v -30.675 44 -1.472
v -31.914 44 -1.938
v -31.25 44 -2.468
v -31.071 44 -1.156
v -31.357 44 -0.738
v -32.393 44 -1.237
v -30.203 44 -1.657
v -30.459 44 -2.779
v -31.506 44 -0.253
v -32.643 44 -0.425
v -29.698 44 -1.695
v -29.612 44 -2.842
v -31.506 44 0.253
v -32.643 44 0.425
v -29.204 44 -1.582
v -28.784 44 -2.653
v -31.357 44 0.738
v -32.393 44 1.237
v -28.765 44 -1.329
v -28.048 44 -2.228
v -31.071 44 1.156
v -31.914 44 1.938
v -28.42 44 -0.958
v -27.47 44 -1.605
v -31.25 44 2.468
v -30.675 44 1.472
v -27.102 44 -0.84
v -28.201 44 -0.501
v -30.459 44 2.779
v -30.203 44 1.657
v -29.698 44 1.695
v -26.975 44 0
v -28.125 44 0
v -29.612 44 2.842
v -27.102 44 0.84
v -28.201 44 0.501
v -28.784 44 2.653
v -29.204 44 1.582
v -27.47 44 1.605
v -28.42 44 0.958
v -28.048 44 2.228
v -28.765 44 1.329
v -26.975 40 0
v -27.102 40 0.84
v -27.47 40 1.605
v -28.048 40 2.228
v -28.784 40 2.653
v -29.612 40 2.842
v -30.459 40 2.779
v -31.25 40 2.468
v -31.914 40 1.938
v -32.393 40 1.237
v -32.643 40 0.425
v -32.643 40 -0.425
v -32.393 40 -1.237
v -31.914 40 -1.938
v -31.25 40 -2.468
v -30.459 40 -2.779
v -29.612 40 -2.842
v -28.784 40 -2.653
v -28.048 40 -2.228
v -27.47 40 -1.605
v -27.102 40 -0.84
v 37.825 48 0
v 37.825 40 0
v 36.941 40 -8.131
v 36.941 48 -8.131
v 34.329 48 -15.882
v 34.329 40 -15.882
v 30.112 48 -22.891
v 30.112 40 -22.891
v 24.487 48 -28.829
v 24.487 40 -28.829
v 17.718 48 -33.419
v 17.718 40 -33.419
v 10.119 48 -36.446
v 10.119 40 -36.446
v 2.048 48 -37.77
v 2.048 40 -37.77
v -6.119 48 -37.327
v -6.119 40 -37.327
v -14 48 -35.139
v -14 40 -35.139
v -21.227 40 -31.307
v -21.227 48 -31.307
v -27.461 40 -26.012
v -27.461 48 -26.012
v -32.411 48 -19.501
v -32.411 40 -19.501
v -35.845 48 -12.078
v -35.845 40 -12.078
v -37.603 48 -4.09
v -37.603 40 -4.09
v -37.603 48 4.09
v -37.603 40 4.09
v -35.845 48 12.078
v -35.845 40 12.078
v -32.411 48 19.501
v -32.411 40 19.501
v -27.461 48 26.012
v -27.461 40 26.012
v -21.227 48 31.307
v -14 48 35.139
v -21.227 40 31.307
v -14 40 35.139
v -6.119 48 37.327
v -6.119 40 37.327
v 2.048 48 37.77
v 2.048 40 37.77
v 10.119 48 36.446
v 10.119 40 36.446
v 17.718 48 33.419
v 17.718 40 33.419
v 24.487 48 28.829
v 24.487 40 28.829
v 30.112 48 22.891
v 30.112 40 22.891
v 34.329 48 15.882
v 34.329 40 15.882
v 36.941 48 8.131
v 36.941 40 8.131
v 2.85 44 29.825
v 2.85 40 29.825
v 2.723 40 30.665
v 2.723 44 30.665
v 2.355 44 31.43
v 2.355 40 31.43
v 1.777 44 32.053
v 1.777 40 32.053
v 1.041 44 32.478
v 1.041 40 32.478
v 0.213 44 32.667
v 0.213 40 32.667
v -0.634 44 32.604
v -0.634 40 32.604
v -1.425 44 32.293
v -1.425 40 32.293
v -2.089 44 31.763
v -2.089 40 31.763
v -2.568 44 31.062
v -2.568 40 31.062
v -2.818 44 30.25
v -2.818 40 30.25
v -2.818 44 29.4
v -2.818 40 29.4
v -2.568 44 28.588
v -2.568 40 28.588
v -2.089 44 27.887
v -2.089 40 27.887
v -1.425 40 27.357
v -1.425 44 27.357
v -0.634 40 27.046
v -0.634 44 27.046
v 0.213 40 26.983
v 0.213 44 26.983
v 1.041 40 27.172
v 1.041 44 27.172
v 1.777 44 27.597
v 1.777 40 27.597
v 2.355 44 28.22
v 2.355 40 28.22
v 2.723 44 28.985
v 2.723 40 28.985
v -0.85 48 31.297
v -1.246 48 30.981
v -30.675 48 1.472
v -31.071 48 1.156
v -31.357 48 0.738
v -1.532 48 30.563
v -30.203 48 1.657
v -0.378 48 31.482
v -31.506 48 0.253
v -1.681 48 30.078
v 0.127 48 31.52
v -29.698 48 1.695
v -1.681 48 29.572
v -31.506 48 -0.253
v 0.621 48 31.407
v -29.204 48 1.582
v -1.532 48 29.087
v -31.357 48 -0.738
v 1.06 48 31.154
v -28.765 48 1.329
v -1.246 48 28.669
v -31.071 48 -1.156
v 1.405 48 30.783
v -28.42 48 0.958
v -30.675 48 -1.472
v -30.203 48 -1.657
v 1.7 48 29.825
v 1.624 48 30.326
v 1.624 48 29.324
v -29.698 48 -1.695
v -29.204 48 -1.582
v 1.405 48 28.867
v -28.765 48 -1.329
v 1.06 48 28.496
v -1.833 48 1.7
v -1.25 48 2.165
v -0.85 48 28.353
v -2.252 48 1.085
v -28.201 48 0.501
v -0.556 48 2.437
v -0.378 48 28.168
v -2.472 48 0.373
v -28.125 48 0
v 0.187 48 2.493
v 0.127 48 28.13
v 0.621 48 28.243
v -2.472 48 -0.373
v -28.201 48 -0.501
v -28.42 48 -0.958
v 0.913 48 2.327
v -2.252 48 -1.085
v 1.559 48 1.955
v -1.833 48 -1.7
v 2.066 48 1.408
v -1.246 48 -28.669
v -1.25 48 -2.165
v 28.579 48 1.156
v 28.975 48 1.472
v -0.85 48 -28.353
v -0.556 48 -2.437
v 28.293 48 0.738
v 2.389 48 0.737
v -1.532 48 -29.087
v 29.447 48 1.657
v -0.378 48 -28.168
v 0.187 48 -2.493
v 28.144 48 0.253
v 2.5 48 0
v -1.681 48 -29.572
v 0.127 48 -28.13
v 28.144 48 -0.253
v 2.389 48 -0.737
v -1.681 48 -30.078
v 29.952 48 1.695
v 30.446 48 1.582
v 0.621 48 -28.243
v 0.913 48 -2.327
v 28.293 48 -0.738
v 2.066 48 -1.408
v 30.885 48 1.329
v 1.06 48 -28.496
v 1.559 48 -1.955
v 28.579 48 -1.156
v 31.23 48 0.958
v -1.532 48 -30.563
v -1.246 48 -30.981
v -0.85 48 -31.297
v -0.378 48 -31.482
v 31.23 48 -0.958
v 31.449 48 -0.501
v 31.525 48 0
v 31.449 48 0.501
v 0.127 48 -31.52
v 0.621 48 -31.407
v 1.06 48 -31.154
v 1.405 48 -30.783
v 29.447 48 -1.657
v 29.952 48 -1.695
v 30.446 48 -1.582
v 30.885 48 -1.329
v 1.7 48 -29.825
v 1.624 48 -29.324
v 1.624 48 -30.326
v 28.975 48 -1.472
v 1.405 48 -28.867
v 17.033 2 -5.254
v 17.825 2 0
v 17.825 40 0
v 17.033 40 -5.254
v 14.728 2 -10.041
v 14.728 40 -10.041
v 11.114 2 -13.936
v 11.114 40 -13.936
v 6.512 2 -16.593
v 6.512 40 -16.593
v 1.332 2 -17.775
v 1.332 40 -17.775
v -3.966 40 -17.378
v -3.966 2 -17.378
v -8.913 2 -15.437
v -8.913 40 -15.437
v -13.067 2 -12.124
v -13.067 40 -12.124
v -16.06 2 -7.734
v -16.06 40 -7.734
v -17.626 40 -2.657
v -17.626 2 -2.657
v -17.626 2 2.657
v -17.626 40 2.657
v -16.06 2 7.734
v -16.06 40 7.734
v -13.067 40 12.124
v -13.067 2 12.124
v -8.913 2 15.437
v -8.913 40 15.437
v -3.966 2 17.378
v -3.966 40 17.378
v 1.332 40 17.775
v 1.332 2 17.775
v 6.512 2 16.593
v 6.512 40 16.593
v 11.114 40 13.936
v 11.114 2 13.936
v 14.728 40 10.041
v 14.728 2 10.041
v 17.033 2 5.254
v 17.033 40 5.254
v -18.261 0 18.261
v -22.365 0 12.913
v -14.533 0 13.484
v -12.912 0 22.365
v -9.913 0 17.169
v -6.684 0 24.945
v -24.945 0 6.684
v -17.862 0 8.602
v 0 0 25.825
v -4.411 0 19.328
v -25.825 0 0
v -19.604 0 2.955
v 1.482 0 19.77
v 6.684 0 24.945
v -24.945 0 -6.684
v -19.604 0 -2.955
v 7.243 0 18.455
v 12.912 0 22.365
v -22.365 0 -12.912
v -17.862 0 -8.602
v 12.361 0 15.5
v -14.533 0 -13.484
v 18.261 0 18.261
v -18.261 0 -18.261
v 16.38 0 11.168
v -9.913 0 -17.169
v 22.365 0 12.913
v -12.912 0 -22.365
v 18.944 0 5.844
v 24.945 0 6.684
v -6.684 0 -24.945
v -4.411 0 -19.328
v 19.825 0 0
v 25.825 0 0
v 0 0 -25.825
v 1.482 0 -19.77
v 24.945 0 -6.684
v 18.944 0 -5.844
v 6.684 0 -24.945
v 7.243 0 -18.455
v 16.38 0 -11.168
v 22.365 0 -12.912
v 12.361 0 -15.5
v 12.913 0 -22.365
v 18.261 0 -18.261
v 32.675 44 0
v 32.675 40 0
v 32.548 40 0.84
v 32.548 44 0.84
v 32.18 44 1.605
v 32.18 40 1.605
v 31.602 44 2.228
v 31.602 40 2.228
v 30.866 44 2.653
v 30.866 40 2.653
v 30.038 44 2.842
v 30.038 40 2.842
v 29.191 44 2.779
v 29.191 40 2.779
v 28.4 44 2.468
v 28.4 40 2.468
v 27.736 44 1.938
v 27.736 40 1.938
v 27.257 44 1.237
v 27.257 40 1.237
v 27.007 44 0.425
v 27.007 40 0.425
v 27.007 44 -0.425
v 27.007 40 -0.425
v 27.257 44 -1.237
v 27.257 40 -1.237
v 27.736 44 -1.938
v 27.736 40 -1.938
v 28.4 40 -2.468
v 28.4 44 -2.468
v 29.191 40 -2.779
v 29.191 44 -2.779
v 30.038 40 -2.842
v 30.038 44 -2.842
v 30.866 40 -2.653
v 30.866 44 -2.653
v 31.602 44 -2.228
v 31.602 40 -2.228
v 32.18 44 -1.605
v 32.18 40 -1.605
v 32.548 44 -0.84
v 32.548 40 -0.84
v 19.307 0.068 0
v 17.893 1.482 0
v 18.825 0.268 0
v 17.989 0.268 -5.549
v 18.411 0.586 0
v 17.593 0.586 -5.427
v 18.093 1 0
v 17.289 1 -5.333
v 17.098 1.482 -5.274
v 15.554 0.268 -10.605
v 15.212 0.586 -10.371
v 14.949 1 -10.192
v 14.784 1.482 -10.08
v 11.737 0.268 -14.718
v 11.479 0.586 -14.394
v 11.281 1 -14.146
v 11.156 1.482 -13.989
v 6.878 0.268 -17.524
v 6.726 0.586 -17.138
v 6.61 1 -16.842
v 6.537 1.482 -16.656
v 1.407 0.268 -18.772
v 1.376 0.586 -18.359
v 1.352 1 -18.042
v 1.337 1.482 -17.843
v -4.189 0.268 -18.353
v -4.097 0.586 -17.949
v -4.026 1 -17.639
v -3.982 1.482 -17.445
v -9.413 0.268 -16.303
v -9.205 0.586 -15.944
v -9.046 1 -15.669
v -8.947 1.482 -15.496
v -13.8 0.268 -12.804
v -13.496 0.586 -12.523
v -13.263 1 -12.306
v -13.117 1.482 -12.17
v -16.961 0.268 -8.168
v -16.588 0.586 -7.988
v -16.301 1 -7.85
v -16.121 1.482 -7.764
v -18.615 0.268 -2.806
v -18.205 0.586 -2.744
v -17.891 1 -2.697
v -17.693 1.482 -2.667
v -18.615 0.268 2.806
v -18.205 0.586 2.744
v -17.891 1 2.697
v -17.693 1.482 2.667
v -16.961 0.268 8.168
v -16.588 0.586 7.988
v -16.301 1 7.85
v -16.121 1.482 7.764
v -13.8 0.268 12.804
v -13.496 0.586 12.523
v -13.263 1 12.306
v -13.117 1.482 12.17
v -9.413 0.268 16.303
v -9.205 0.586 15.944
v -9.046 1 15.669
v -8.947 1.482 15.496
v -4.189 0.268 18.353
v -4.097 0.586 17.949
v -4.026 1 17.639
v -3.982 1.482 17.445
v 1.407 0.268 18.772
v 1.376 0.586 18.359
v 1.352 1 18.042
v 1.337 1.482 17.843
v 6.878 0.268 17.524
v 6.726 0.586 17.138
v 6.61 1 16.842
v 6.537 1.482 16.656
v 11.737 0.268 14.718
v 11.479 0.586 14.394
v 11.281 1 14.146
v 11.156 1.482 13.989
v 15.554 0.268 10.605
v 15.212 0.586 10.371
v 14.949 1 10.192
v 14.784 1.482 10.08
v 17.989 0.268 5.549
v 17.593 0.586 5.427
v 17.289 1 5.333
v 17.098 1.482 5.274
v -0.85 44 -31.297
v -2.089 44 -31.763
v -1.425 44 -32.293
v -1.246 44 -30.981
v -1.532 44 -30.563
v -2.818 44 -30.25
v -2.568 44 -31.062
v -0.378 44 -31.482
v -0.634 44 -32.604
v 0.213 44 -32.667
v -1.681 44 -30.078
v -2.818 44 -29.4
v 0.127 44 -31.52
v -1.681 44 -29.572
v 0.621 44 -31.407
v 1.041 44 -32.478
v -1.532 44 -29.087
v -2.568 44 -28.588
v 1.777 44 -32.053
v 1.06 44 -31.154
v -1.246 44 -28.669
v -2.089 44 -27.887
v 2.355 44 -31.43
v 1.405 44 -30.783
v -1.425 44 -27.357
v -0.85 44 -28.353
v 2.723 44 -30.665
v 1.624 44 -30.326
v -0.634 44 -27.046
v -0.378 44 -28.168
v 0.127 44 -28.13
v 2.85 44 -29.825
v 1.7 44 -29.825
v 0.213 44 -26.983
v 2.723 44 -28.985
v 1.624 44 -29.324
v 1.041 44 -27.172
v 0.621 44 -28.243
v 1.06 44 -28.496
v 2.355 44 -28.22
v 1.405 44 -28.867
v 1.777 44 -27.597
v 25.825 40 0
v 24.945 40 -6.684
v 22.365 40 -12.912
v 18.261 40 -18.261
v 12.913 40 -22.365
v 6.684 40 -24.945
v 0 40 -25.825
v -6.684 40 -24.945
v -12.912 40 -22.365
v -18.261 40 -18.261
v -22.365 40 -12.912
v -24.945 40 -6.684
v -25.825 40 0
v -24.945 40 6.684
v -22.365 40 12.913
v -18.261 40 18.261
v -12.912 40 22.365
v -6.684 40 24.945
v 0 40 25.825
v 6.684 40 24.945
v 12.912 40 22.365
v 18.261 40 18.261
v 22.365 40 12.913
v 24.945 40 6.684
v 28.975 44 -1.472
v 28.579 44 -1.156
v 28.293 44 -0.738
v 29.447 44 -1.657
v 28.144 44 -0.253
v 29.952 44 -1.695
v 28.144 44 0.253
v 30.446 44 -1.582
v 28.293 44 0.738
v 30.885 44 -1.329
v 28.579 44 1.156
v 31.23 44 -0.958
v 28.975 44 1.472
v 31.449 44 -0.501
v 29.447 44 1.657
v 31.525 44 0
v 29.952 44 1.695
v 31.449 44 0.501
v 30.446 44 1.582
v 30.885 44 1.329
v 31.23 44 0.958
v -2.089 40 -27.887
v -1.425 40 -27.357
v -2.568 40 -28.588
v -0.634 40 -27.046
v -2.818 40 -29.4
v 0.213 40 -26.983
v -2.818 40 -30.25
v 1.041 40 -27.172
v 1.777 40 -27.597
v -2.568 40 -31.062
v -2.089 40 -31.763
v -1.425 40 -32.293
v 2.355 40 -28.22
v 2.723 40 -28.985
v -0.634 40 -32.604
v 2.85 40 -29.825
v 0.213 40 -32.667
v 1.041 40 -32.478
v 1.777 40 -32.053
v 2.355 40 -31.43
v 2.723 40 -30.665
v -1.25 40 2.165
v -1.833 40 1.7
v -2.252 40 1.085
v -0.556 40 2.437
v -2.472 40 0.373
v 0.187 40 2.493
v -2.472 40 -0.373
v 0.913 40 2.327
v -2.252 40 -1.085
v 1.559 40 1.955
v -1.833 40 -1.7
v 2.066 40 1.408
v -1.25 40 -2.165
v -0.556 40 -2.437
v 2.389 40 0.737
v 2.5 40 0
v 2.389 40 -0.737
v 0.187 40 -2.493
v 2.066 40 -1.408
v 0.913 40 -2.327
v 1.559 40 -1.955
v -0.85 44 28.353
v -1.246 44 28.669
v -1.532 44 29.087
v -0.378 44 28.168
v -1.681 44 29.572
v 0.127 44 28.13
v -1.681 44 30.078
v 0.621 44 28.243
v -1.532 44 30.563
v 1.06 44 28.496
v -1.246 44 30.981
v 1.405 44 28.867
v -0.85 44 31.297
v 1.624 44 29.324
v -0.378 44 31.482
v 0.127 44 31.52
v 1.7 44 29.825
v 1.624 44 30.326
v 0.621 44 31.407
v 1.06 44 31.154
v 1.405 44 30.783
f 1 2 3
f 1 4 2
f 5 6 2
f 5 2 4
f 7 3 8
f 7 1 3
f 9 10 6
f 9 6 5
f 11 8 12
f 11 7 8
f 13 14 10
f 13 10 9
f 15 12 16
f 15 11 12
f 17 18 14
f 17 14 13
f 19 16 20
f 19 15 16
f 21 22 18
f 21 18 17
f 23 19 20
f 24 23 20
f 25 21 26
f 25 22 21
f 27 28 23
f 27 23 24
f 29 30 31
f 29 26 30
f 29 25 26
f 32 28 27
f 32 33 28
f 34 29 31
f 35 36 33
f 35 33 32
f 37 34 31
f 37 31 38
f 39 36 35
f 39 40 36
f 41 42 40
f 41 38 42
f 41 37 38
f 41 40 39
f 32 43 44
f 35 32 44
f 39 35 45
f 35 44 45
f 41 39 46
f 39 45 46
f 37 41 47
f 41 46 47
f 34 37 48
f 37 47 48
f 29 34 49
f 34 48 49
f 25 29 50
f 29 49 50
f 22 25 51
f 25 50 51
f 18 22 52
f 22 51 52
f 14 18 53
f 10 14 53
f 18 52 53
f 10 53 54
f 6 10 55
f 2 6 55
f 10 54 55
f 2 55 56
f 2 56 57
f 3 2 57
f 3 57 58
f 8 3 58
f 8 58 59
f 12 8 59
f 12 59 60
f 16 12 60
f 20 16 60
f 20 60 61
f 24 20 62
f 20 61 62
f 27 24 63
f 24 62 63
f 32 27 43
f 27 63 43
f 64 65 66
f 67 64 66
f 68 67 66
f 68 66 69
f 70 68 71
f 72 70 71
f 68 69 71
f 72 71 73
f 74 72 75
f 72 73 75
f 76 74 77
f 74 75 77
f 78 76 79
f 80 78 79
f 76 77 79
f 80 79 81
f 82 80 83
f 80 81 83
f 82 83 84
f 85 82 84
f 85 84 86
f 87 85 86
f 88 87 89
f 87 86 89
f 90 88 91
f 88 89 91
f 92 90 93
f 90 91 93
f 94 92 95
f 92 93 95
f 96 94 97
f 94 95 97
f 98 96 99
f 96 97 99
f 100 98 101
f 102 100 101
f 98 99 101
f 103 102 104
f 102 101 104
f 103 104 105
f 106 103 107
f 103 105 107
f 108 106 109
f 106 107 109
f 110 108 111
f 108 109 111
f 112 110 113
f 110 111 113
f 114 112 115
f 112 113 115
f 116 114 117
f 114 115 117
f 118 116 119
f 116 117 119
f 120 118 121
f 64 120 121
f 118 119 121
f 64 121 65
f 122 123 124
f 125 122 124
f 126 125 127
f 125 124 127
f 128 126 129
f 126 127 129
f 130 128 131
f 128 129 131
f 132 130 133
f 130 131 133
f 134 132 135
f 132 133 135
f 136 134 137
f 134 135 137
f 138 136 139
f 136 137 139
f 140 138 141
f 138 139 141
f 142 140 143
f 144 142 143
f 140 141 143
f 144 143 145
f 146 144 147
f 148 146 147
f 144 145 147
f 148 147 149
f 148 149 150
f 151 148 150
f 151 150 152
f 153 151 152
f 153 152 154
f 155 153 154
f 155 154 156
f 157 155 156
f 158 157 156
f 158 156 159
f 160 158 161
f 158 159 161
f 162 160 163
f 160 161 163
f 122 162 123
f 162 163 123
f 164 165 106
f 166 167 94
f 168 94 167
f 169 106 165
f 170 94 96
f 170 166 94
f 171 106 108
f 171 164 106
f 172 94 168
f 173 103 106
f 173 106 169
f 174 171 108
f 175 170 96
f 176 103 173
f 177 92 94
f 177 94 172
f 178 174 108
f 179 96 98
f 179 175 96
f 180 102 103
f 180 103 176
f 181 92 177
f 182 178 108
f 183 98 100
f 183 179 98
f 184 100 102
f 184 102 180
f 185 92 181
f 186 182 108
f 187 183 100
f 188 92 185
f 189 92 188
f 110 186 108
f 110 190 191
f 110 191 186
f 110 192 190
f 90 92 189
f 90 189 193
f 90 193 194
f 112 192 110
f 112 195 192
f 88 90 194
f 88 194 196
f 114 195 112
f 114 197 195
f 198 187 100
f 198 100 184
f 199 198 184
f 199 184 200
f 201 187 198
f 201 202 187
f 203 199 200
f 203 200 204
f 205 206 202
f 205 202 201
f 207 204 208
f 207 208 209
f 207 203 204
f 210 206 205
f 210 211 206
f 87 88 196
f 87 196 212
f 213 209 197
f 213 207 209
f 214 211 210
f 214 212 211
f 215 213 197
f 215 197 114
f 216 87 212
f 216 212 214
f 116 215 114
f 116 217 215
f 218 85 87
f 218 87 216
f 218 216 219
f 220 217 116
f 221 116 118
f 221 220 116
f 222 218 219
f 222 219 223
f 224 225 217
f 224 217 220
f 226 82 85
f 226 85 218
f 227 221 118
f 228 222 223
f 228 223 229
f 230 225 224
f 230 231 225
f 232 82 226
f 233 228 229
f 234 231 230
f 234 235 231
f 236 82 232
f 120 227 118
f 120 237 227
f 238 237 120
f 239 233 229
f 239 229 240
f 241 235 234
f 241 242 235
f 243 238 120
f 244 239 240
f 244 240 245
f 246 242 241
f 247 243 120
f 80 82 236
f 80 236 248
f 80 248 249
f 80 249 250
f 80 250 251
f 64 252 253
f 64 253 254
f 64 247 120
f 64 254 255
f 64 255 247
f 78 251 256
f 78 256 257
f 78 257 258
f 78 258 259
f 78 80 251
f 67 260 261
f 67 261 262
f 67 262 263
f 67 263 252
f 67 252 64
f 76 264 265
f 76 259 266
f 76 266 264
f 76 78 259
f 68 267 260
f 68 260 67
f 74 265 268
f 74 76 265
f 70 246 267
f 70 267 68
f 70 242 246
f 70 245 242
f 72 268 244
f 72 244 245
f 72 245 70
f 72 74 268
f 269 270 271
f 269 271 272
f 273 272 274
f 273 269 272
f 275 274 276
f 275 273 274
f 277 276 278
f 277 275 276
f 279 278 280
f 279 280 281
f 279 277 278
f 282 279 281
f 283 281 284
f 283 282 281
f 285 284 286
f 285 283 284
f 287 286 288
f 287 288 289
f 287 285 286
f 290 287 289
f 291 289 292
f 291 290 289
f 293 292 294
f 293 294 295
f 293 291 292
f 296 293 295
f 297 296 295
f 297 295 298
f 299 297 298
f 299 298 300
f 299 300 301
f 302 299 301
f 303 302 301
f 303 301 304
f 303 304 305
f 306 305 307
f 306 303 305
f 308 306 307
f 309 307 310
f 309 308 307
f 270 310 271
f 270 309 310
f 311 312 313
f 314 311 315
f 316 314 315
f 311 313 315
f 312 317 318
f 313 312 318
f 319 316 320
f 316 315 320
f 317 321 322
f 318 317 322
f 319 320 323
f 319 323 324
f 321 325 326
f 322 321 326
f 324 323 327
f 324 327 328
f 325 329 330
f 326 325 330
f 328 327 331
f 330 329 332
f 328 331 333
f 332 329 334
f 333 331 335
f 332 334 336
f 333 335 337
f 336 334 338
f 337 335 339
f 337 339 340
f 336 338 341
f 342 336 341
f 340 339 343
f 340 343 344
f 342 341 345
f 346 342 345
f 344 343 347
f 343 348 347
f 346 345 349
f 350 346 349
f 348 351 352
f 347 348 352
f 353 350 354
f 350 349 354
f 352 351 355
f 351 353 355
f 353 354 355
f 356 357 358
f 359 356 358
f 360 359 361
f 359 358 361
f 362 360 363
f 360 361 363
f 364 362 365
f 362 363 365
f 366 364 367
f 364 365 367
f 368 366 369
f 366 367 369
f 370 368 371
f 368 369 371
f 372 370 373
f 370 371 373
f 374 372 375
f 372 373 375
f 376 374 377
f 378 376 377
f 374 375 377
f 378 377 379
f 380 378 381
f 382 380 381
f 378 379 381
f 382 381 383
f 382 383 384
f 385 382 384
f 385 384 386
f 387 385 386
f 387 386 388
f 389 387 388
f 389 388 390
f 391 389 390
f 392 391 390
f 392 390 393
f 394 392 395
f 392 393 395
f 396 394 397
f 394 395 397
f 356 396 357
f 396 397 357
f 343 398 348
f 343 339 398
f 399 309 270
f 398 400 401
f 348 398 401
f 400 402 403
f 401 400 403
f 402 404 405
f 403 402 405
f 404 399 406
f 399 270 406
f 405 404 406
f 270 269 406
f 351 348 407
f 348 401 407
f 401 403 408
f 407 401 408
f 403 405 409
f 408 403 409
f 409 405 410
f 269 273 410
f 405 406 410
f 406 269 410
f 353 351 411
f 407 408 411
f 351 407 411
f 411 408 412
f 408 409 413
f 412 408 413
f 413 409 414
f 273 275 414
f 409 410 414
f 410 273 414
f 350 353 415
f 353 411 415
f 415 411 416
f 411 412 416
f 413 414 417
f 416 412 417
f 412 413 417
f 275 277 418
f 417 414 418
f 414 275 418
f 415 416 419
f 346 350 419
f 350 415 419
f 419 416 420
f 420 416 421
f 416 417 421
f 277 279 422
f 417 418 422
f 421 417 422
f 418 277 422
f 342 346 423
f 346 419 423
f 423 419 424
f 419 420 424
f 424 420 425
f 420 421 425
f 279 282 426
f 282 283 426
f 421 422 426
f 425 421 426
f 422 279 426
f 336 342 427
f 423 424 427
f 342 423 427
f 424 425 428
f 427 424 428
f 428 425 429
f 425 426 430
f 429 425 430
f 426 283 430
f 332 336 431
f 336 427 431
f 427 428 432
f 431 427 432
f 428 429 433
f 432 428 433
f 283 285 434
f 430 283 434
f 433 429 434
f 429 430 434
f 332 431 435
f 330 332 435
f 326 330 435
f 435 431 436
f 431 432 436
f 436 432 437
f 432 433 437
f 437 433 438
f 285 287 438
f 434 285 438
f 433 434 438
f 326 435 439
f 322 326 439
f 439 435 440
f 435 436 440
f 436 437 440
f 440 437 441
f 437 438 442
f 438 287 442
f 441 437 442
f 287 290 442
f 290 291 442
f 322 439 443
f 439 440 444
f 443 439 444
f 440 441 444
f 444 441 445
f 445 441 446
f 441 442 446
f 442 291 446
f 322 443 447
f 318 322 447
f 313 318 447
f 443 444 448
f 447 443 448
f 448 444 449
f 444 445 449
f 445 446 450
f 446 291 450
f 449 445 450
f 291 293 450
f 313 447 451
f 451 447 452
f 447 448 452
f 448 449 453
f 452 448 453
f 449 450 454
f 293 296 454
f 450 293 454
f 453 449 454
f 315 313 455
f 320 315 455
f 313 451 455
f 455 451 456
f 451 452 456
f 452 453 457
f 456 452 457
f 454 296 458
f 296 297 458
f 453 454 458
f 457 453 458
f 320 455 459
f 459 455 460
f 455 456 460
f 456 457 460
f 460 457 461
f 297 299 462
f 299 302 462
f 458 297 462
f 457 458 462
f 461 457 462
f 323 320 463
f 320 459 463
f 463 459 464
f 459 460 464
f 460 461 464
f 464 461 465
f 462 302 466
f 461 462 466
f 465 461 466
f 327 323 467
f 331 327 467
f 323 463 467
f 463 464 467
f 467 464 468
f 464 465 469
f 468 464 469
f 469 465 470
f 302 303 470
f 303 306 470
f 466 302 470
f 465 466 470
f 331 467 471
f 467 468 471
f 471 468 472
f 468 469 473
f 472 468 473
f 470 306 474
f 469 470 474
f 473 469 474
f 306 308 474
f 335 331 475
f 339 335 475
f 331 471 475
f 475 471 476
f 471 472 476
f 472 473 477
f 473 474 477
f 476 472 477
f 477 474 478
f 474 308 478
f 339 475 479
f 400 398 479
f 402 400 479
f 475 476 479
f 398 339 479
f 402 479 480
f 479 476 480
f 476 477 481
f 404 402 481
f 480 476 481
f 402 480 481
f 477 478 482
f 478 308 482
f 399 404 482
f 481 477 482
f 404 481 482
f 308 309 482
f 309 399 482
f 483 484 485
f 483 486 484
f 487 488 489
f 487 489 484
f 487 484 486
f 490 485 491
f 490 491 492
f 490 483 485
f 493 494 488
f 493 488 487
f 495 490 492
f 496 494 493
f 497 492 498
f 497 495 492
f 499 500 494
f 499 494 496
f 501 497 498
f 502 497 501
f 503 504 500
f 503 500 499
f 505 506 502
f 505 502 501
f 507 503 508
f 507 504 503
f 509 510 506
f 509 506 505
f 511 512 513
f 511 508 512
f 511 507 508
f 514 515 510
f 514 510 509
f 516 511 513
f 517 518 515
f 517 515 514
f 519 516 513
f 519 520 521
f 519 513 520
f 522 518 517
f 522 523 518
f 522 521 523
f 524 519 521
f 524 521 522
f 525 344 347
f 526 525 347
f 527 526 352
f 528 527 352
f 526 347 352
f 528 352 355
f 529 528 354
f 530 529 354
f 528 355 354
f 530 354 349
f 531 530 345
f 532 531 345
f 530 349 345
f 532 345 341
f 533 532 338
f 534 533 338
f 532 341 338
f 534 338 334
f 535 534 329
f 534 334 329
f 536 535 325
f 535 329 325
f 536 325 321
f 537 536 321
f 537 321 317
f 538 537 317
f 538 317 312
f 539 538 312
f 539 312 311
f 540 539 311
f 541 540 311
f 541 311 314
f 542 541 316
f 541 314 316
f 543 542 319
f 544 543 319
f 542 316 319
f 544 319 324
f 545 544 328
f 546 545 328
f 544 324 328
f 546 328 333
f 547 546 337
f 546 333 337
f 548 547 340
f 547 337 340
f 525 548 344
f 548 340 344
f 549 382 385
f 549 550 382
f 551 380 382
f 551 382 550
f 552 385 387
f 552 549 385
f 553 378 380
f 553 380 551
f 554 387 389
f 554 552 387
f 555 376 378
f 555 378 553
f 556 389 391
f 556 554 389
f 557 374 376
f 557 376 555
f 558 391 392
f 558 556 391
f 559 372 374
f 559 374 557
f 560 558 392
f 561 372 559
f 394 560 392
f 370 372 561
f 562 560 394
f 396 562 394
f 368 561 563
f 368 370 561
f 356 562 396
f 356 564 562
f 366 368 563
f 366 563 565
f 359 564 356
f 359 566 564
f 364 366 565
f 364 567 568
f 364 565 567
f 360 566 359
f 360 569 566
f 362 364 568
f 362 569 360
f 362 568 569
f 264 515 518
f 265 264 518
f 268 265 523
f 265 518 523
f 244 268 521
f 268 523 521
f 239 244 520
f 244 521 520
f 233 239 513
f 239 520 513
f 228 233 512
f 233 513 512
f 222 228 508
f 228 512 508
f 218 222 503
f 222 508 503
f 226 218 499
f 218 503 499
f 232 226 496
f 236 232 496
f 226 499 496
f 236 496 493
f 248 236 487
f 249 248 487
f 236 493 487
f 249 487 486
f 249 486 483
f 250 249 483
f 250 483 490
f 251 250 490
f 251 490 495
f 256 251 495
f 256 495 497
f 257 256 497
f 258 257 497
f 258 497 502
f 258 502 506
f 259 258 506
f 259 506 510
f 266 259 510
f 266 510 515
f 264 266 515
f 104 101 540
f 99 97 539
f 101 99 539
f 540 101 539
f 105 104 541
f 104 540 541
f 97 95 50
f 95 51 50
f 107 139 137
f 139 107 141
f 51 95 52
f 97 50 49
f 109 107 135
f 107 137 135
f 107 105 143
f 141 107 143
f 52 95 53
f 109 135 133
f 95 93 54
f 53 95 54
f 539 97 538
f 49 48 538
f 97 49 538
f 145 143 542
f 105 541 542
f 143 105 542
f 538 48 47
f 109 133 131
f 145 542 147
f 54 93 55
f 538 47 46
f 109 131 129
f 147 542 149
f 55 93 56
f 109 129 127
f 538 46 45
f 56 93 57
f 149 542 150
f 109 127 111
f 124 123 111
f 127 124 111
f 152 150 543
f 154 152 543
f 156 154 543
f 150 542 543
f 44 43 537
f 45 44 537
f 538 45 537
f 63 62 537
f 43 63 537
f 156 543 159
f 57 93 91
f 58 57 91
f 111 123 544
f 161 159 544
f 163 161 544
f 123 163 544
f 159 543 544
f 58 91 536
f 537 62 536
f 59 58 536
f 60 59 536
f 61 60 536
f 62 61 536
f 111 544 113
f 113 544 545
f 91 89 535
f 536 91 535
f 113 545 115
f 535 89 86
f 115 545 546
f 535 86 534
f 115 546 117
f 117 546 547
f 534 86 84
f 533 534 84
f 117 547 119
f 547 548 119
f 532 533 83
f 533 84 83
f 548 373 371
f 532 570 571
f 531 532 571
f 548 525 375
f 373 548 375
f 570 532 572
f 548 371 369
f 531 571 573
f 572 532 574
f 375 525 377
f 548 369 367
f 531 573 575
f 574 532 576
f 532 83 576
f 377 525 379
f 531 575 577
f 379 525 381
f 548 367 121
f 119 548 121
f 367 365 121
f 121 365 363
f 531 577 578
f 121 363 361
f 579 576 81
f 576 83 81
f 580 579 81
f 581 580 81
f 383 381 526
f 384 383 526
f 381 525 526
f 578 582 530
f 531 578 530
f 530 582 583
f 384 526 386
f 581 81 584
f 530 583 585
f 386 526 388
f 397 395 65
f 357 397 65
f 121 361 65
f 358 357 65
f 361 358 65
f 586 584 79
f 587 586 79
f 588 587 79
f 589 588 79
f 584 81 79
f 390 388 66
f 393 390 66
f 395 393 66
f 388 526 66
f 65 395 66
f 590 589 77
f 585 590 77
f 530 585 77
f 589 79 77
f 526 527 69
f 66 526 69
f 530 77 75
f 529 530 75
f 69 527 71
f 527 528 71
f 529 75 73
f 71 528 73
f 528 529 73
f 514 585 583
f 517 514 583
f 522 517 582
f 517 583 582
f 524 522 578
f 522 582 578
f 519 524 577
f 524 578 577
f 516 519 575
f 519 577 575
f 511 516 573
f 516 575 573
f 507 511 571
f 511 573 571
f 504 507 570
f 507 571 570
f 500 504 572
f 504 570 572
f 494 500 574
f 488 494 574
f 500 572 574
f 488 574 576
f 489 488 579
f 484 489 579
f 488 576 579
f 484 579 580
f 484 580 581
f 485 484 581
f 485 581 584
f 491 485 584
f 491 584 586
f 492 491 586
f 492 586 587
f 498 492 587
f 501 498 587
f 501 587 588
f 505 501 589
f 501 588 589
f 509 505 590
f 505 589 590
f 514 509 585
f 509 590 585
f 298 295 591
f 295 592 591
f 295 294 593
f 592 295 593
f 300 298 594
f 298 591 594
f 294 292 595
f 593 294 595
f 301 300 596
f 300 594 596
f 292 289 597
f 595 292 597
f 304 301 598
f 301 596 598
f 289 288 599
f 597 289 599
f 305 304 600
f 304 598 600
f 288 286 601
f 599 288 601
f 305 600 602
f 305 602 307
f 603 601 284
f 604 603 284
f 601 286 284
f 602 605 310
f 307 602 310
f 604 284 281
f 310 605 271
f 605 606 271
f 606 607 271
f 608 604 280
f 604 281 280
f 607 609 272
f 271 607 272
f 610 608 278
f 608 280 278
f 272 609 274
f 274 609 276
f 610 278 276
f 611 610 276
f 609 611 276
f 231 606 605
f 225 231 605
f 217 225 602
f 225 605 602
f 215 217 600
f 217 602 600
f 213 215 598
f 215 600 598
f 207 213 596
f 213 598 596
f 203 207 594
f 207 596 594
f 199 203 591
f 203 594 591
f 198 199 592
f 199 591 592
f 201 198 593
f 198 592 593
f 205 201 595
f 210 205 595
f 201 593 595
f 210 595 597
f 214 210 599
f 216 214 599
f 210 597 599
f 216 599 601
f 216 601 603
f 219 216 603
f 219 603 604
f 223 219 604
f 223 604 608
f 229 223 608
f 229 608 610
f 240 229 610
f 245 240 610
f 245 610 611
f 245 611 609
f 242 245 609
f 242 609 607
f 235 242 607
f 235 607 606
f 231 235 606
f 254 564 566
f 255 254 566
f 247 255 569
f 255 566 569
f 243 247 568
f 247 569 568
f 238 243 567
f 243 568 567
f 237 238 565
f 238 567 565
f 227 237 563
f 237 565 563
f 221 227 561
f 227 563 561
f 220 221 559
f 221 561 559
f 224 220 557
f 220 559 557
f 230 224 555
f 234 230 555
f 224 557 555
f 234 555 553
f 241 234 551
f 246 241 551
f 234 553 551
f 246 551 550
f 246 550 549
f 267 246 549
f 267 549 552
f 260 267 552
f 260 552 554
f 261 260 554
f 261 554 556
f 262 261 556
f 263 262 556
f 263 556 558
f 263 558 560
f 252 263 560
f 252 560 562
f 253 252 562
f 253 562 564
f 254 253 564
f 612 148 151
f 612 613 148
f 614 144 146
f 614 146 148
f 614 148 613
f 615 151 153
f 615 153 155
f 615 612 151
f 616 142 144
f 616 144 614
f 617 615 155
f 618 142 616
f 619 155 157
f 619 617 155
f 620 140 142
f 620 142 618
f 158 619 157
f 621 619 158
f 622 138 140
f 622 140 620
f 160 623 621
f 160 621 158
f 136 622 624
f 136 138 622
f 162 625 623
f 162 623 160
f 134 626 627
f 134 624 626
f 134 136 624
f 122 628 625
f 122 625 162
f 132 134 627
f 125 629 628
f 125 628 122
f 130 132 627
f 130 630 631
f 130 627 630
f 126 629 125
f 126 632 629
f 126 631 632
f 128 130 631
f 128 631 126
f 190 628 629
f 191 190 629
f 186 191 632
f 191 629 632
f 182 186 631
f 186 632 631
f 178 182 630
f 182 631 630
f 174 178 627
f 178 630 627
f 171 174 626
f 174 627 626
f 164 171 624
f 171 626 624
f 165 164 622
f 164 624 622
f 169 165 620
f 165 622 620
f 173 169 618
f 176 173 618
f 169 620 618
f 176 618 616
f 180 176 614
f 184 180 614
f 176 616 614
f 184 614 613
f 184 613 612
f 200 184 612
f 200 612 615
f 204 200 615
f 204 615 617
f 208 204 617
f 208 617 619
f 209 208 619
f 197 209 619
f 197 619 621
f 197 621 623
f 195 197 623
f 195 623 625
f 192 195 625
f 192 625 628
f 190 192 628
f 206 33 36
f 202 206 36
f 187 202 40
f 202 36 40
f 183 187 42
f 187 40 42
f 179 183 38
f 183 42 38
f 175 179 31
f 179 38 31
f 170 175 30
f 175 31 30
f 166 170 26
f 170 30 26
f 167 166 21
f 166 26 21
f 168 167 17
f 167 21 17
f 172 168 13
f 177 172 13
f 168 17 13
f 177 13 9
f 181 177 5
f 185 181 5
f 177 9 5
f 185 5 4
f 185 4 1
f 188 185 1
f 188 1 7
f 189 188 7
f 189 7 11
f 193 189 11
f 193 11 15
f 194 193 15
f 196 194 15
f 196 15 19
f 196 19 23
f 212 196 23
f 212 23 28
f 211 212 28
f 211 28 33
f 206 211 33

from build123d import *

# Parameters (mm, degrees)
SKETCH1_R           = 25.825
SKETCH1_R_2         = 17.825
BOSS_EXTRUDE1_DEPTH = 40
SKETCH2_R           = 37.825
BOSS_EXTRUDE2_DEPTH = 8
SKETCH4_R           = 1.7
CUT_EXTRUDE2_DEPTH  = 9
SKETCH5_R           = 2.85
CUT_EXTRUDE3_DEPTH  = 4
FILLET1_R           = 2
SKETCH6_R           = 2.5
CUT_EXTRUDE4_DEPTH  = 9


with BuildPart() as part:
    # Sketch1 → Boss-Extrude1 (new body)
    with BuildSketch(Plane(origin=(0, 0, 0), x_dir=(1, 0, 0), z_dir=(0, 1, 0))):
        Circle(SKETCH1_R)
        Circle(SKETCH1_R_2, mode=Mode.SUBTRACT)
    extrude(amount=BOSS_EXTRUDE1_DEPTH)

    # Sketch2 → Boss-Extrude2 (add)
    with BuildSketch(Plane(origin=(0, 40, 0), x_dir=(1, 0, 0), z_dir=(0, 1, 0))):
        Circle(SKETCH2_R)
    extrude(amount=BOSS_EXTRUDE2_DEPTH)

    # Sketch4 → Cut-Extrude2 (cut, through all)
    with BuildSketch(Plane.XZ.offset(-40)):
        with Locations((0, 29.825)):
            Circle(SKETCH4_R)
        with Locations((29.825, 0)):
            Circle(SKETCH4_R)
        with Locations((0, -29.825)):
            Circle(SKETCH4_R)
        with Locations((-29.825, 0)):
            Circle(SKETCH4_R)
    extrude(amount=-CUT_EXTRUDE2_DEPTH, mode=Mode.SUBTRACT)

    # Sketch5 → Cut-Extrude3 (cut)
    with BuildSketch(Plane.XZ.offset(-40)):
        with Locations((0, 29.825)):
            Circle(SKETCH5_R)
        with Locations((29.825, 0)):
            Circle(SKETCH5_R)
        with Locations((0, -29.825)):
            Circle(SKETCH5_R)
        with Locations((-29.825, 0)):
            Circle(SKETCH5_R)
    extrude(amount=-CUT_EXTRUDE3_DEPTH, mode=Mode.SUBTRACT)

    # Fillet1
    fillet1_edges = [part.edges().sort_by_distance(p)[0] for p in [
        (-17.825, 0, 0),
    ]]
    fillet(fillet1_edges, radius=FILLET1_R)

    # Sketch6 → Cut-Extrude4 (cut, through all)
    with BuildSketch(Plane.XZ.offset(-40)):
        Circle(SKETCH6_R)
    extrude(amount=-CUT_EXTRUDE4_DEPTH, mode=Mode.SUBTRACT)


solid = part.part
